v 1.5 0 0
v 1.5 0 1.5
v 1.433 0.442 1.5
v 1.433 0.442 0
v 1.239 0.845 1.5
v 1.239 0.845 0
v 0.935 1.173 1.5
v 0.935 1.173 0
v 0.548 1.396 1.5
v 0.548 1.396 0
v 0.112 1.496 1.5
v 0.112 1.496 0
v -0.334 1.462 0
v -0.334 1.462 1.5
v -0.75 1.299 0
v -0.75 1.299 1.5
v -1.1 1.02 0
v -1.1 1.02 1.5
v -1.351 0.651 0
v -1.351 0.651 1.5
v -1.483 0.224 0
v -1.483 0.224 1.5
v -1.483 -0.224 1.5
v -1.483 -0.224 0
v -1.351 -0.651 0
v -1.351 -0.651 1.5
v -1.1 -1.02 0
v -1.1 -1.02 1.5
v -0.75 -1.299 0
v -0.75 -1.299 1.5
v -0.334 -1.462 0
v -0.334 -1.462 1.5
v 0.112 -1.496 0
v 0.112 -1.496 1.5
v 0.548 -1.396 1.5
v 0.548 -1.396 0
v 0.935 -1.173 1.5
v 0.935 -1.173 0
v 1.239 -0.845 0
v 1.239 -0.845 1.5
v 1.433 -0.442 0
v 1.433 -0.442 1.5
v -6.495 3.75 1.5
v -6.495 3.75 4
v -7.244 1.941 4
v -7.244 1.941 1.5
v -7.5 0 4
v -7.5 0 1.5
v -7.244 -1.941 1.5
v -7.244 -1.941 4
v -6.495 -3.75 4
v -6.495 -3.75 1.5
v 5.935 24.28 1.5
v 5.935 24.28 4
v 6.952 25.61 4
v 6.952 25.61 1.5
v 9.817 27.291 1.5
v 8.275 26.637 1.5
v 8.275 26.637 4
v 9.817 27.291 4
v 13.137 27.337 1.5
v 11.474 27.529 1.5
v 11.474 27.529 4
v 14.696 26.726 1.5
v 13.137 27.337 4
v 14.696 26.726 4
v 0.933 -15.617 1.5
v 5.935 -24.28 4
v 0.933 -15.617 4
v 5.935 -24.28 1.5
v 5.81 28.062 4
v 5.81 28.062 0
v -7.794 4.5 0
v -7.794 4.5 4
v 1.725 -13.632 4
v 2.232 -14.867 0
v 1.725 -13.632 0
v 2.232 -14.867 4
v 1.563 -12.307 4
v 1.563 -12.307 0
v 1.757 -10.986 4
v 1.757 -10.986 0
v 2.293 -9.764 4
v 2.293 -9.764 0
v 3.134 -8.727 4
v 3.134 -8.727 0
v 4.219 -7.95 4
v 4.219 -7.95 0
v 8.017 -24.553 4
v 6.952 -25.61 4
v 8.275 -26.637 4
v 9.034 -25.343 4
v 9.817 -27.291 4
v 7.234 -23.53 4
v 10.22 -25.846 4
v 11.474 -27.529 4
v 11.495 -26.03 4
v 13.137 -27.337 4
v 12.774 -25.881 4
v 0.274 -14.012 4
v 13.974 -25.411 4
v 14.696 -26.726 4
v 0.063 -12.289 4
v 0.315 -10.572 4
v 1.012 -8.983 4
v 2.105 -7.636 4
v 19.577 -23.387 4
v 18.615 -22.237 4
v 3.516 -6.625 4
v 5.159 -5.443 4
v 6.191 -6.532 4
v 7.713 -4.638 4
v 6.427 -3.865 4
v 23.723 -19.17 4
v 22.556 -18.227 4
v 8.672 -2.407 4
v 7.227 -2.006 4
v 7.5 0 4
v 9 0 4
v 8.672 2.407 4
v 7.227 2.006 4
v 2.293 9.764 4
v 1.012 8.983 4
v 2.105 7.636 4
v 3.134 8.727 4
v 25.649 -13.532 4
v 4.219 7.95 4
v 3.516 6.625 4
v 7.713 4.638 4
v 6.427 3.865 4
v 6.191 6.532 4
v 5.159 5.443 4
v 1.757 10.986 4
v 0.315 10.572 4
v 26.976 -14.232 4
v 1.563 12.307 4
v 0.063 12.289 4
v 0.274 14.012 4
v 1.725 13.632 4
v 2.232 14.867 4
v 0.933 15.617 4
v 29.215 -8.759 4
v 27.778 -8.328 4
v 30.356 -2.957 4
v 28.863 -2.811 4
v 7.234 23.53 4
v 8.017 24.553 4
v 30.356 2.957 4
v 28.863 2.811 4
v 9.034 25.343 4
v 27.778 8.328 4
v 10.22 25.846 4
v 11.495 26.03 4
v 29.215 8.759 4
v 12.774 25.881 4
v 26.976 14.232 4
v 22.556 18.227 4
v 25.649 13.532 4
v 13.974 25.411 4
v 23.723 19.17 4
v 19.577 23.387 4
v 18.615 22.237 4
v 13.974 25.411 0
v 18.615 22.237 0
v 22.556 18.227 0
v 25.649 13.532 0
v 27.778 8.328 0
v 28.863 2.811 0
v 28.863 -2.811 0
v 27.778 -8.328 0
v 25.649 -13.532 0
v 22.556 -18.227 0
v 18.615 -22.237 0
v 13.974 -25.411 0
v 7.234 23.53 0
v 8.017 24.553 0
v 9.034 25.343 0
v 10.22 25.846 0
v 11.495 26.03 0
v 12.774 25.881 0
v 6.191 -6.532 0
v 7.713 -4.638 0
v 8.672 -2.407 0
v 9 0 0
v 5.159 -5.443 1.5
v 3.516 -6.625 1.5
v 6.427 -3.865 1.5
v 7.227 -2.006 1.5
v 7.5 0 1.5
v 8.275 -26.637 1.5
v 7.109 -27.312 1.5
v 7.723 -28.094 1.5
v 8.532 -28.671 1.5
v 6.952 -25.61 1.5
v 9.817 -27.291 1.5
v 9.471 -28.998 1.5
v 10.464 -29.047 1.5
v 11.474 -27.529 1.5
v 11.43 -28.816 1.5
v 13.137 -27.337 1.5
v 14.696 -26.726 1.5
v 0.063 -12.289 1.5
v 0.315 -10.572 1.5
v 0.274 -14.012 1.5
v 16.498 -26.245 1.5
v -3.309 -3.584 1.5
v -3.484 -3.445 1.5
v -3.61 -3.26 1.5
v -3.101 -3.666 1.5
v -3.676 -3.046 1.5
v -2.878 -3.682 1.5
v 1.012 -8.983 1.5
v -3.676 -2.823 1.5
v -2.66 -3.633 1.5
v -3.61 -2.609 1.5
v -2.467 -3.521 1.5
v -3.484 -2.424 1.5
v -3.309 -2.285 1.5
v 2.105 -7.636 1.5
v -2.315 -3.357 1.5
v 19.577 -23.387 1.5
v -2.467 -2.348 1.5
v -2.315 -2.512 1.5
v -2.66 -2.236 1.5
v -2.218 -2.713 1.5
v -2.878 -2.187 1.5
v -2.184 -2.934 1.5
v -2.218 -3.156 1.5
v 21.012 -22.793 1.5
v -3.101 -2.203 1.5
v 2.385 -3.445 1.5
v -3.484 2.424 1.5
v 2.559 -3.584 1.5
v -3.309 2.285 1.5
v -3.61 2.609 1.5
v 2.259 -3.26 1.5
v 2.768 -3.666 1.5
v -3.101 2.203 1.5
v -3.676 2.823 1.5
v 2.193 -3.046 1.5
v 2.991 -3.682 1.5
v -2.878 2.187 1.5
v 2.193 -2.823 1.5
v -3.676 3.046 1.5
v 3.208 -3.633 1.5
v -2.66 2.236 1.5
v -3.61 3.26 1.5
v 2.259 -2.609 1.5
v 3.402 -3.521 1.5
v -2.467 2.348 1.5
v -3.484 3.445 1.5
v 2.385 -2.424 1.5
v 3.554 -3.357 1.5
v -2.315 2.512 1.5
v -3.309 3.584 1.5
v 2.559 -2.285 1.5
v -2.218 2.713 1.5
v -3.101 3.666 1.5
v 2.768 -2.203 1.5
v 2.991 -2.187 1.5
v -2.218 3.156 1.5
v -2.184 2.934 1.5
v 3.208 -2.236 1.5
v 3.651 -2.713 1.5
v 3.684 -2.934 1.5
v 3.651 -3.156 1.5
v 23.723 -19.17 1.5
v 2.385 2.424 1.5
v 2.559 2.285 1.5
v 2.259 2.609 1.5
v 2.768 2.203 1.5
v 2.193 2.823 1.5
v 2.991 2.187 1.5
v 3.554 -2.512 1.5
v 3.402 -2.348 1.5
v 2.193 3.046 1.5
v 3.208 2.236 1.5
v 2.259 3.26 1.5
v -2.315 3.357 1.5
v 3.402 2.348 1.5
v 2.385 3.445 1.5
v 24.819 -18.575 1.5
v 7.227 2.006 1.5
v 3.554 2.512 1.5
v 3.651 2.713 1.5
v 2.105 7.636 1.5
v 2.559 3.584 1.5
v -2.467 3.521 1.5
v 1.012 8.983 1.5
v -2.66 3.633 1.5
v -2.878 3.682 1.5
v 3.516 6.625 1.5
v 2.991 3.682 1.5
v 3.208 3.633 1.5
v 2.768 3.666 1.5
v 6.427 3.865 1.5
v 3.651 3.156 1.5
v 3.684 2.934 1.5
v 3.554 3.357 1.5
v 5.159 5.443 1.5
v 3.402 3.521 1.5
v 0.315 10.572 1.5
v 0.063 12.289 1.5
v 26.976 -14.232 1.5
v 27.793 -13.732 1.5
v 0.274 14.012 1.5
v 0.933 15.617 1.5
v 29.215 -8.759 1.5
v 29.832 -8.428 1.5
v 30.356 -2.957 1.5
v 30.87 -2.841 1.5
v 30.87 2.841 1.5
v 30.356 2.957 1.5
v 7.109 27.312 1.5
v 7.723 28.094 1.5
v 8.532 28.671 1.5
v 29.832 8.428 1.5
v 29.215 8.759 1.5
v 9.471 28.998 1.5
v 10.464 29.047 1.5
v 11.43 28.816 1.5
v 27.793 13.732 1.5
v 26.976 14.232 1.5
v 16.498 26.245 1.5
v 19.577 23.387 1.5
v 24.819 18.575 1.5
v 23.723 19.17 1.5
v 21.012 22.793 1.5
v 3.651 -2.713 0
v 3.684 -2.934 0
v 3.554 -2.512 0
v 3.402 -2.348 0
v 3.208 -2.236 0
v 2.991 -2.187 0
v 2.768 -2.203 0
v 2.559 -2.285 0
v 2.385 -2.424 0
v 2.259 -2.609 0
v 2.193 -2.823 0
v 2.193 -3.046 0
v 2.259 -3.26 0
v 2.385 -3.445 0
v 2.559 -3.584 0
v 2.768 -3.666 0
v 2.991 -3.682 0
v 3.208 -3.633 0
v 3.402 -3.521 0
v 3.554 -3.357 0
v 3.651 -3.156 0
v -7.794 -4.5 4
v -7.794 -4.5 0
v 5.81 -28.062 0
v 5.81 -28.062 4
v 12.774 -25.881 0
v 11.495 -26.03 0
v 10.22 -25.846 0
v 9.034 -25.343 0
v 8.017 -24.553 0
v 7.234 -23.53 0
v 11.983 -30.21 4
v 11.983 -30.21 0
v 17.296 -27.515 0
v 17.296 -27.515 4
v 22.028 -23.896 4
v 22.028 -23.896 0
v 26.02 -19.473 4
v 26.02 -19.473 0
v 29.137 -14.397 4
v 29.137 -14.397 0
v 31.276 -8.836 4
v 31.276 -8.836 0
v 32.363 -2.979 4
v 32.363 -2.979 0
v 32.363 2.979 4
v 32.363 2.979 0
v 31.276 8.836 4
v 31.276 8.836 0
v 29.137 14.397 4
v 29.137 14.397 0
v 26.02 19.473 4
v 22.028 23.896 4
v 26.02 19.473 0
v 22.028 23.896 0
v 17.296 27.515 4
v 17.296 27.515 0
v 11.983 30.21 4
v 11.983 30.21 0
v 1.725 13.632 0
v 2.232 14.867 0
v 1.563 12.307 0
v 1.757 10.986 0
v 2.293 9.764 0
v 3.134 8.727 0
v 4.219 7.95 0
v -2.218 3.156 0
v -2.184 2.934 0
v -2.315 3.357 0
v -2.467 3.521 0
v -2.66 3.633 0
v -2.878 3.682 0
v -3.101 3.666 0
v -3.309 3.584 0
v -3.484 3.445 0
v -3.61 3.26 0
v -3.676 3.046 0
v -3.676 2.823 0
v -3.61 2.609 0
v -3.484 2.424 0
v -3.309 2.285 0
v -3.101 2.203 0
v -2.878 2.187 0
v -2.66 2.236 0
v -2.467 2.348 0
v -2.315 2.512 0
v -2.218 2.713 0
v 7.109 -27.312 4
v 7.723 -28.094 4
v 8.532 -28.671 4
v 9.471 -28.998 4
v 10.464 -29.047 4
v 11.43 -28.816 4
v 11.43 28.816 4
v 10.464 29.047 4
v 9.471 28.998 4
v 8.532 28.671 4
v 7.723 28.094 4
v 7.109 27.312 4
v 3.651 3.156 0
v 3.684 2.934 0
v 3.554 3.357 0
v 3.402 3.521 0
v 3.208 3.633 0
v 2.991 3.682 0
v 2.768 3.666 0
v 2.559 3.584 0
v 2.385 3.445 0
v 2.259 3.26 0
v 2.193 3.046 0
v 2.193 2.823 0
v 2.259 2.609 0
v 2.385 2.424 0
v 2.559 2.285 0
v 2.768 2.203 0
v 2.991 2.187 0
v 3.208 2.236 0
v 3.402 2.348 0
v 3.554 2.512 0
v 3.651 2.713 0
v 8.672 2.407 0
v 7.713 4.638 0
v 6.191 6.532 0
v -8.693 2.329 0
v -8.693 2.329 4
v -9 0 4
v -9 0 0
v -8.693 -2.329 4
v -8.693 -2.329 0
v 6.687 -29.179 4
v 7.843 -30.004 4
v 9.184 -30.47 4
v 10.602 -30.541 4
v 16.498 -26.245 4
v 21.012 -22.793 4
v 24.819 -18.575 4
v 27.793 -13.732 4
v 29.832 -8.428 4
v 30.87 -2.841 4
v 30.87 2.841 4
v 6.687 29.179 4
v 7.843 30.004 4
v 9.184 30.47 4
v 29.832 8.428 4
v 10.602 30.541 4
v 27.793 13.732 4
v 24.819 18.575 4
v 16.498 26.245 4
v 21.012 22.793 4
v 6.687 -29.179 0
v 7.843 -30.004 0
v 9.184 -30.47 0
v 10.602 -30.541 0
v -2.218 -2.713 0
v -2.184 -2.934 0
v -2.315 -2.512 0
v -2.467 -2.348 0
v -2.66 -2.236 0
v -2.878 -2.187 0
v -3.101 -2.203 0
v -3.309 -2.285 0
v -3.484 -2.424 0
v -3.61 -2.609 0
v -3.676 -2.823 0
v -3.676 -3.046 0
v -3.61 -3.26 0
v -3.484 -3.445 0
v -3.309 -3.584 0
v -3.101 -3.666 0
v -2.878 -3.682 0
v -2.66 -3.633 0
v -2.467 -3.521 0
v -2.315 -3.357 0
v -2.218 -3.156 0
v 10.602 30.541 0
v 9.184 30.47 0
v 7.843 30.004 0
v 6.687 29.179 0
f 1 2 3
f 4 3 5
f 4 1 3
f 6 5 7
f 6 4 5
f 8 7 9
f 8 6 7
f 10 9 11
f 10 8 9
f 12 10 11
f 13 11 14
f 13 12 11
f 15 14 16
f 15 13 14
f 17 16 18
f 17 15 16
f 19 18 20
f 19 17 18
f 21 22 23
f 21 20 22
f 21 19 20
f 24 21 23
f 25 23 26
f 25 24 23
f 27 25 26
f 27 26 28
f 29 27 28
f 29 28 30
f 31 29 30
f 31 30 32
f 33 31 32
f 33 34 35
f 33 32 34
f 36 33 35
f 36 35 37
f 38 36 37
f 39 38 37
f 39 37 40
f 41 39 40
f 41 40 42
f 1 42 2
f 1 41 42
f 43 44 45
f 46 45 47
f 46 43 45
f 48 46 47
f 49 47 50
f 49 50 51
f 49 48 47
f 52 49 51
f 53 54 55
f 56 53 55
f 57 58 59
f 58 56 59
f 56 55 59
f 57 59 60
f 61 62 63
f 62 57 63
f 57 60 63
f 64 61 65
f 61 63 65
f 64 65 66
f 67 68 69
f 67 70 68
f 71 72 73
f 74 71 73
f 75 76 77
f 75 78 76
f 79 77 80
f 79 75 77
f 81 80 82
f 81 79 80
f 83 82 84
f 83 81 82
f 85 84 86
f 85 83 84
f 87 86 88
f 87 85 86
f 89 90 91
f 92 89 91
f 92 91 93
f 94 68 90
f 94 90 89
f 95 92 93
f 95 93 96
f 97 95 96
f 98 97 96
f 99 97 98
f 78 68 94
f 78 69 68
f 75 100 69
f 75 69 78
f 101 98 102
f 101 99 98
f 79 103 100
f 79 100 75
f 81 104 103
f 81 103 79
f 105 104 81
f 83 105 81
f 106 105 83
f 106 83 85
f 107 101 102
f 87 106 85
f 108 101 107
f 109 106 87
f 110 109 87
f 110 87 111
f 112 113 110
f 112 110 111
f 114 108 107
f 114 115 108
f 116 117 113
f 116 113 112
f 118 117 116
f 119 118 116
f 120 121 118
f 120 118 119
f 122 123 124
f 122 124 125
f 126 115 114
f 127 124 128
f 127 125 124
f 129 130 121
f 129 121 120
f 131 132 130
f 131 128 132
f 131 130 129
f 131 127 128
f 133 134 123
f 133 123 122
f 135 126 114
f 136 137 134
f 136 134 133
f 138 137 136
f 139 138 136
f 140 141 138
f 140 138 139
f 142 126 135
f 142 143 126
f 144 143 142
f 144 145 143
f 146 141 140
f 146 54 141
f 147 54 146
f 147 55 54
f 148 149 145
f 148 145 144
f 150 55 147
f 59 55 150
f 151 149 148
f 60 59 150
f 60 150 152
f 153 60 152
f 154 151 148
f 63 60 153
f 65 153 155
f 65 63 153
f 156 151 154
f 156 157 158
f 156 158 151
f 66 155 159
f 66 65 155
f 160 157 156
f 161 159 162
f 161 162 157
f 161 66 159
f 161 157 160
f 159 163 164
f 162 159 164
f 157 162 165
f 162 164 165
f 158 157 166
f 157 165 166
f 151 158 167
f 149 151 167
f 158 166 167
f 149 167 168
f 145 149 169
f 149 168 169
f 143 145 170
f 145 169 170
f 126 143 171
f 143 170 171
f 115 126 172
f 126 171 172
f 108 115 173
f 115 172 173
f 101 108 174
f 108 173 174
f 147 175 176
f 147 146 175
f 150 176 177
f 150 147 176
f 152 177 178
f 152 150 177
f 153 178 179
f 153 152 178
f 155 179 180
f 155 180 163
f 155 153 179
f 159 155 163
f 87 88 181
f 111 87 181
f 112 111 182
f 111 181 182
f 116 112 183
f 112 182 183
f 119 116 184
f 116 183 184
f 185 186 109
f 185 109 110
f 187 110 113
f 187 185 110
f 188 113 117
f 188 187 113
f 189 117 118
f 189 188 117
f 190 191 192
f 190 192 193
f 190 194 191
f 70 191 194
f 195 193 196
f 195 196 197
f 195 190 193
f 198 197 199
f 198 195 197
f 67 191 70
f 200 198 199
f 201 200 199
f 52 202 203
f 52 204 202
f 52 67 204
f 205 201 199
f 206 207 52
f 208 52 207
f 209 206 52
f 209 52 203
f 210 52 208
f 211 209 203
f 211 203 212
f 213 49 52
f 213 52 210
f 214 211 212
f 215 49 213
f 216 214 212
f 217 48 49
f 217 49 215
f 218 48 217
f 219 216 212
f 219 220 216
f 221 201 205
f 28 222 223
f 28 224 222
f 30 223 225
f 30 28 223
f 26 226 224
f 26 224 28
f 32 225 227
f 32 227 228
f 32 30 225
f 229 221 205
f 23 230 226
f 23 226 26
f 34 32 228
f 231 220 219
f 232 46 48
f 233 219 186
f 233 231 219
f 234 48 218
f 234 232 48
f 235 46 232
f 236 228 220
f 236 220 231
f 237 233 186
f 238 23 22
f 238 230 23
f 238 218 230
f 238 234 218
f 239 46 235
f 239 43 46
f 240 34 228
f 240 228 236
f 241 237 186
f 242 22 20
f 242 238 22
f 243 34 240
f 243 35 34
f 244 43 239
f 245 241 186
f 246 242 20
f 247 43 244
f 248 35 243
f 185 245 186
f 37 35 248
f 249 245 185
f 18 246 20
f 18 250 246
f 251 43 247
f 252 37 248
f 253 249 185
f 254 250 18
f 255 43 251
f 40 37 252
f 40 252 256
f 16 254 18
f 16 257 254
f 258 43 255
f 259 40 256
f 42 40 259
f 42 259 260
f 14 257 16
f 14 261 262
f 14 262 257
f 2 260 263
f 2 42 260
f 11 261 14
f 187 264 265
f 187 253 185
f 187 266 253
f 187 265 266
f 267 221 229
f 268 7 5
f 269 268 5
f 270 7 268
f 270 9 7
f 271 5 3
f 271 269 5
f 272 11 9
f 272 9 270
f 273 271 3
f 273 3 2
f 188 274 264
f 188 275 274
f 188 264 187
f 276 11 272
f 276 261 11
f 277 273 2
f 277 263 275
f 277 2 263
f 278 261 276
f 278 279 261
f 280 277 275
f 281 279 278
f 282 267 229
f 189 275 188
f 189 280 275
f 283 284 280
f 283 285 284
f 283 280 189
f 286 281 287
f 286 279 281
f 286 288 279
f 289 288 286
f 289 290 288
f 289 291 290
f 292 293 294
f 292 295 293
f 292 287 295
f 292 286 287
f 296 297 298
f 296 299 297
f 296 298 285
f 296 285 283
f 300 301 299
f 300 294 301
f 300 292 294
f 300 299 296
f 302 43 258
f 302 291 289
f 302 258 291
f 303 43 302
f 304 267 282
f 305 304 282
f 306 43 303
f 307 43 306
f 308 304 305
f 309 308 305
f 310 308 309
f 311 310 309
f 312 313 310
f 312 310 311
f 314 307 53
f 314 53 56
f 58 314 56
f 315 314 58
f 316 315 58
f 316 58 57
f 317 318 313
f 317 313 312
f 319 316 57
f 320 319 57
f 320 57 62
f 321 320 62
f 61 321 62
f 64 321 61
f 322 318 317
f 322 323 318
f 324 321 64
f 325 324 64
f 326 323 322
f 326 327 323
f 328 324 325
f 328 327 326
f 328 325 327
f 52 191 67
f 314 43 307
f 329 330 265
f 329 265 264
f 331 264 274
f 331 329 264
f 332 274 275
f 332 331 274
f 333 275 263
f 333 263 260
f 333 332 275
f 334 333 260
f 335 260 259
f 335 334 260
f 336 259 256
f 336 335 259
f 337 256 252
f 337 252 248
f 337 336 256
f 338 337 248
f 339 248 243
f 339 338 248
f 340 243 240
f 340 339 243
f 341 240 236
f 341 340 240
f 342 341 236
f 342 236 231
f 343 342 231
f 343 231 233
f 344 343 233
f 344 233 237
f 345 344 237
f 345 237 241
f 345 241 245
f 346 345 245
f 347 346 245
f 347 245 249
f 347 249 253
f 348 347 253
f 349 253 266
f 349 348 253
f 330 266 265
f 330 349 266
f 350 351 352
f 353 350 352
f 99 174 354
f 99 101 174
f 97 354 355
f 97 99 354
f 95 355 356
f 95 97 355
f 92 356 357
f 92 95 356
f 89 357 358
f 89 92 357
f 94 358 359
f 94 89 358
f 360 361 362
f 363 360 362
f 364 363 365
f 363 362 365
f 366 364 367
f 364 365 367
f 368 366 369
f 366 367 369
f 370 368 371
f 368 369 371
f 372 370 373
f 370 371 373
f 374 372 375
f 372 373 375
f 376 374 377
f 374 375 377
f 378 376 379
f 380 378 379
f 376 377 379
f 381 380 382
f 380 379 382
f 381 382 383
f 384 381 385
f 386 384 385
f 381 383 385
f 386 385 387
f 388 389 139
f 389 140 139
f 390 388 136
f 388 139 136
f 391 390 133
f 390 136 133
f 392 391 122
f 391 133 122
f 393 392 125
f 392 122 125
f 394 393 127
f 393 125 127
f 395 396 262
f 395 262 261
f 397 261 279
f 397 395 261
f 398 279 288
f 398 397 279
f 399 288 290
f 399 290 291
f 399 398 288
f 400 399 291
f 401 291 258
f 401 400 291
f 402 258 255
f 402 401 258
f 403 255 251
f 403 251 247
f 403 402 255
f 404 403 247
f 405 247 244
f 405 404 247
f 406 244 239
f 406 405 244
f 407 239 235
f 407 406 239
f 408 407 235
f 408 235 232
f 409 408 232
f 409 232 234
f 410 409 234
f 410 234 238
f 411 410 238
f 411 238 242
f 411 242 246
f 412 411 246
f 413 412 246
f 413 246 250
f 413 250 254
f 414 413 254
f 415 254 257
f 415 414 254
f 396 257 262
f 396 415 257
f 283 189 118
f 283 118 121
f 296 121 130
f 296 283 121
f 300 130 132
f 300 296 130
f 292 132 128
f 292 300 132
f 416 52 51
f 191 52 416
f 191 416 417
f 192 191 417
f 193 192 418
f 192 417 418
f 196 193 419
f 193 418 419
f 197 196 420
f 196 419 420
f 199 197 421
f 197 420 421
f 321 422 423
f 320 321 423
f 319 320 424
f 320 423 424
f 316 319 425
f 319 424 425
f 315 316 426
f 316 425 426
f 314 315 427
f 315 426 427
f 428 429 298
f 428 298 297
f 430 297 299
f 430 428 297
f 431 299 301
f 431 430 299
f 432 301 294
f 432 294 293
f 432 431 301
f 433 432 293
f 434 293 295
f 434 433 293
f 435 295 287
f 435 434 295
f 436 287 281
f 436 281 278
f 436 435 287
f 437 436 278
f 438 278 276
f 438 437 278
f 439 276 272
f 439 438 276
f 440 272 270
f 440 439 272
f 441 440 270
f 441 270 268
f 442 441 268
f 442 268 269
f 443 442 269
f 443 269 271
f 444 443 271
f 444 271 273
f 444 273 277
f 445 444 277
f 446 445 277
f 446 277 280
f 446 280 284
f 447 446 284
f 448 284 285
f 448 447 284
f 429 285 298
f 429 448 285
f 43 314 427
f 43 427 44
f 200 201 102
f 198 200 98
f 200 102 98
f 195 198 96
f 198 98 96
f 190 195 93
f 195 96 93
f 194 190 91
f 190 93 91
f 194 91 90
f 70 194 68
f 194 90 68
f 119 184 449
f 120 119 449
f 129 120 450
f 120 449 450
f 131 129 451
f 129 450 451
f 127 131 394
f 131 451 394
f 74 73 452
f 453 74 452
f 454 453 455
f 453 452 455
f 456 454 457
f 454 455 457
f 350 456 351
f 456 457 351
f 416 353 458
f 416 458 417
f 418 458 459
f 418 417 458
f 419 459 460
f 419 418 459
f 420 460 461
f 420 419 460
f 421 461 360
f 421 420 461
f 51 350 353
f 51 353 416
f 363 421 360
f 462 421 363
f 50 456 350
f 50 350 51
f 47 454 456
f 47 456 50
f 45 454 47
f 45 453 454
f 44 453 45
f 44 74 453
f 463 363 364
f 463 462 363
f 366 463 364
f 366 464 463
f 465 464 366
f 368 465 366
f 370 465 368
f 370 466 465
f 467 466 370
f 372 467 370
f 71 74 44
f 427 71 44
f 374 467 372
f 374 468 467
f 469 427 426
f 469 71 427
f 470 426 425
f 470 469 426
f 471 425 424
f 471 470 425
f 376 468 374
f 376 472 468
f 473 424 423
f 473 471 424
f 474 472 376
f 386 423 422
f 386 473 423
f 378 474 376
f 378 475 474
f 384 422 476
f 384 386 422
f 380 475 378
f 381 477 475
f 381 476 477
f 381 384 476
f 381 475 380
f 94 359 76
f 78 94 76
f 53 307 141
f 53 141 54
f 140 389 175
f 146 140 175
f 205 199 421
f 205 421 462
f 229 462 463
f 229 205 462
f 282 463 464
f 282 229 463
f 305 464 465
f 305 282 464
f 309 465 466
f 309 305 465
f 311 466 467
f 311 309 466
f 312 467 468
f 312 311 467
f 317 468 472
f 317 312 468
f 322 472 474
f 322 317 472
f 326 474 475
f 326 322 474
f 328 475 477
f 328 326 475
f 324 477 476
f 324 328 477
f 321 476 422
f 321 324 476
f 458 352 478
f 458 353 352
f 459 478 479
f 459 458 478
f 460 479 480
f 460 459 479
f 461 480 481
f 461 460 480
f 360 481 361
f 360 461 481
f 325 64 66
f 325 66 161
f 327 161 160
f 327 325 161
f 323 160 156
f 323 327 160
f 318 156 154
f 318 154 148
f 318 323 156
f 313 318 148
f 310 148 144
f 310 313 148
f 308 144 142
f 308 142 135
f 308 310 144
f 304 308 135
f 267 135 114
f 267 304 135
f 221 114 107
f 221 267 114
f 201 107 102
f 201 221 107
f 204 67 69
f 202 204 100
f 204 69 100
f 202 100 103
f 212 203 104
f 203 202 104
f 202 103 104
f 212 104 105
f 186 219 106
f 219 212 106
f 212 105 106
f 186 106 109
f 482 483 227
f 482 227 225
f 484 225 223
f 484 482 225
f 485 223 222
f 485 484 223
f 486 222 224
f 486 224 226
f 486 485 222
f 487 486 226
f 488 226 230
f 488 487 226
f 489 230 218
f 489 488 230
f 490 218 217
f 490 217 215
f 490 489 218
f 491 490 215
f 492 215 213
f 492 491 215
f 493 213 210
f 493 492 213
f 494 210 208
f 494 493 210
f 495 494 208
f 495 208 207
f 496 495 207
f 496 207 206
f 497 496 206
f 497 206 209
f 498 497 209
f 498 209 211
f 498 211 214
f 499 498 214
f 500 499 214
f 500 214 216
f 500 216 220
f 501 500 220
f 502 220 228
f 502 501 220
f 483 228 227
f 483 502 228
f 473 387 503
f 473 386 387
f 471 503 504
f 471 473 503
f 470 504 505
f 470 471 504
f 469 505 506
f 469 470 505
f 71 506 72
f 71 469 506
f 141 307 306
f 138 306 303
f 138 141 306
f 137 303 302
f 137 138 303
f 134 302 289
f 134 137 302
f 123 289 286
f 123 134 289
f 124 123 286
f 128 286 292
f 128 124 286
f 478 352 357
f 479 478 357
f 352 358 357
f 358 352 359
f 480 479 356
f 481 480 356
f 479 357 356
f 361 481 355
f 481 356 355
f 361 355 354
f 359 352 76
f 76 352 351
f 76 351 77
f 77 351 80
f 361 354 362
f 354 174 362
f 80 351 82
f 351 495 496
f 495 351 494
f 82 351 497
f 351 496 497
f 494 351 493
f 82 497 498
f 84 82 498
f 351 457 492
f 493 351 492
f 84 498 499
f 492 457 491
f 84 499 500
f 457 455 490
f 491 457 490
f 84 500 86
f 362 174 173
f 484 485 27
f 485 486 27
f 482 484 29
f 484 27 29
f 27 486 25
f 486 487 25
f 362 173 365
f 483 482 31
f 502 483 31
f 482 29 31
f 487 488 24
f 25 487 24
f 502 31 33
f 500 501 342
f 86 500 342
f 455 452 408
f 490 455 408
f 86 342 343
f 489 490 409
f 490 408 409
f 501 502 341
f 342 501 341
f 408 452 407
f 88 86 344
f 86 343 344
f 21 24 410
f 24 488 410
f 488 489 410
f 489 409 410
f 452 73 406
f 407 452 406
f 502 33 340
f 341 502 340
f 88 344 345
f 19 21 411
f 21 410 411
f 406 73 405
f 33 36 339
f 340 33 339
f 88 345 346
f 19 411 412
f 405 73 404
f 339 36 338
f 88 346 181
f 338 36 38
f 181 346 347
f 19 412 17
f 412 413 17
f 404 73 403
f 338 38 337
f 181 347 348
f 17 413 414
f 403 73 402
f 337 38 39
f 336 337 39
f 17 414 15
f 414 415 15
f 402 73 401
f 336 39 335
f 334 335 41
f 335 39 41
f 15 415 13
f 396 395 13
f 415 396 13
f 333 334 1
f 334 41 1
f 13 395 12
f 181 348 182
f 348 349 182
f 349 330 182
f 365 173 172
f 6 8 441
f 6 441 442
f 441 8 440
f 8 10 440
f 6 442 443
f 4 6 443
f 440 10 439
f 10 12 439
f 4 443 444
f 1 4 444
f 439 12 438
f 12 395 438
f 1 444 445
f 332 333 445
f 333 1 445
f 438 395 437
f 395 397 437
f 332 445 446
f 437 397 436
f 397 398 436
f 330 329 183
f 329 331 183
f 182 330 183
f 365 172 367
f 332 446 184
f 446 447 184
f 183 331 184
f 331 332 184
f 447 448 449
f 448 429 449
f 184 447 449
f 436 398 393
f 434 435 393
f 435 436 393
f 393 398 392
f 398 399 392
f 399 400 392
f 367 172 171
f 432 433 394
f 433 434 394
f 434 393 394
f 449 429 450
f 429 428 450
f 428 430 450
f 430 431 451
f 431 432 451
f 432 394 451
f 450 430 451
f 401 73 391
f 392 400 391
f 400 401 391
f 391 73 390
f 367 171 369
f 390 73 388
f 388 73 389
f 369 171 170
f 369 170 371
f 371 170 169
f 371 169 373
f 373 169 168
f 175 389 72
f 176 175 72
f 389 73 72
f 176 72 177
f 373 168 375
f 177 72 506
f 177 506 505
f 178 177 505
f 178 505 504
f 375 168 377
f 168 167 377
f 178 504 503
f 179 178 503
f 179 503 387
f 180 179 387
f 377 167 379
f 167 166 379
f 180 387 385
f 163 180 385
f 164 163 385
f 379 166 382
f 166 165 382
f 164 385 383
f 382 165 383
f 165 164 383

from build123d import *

# Parameters (mm, degrees)
F1_DEPTH = 4
F2_R     = 5
F3_T     = -1.5
F4_R     = 1.5
F5_DEPTH = 3
F6_R     = 0.75
F7_DEPTH = 1.5


with BuildPart() as f1:
    # F0 (on Top) → F1 (new body)
    with BuildSketch(Plane.XY):
        with BuildLine():
            ThreePointArc((-7.794229, 4.5), (-5.011221, 7.475805), (-1.201188, 8.919481))
            Line((-1.201188, 8.919481), (9.473696, 27.408923))
            ThreePointArc((9.473696, 27.408923), (29, 0), (9.473696, -27.408923))
            Line((9.473696, -27.408923), (-1.201188, -8.919481))
            ThreePointArc((-1.201188, -8.919481), (-5.011221, -7.475805), (-7.794229, -4.5))
            Line((-7.794229, -4.5), (7.820268, -31.545101))
            ThreePointArc((7.820268, -31.545101), (32.5, 0), (7.820268, 31.545101))
            Line((7.820268, 31.545101), (-7.794229, 4.5))
        make_face()
        with BuildLine():
            ThreePointArc((-1.201188, -8.919481), (5.924074, -6.775348), (9, 0))
            ThreePointArc((9, 0), (5.924074, 6.775348), (-1.201188, 8.919481))
            ThreePointArc((-1.201188, 8.919481), (-5.011221, 7.475805), (-7.794229, 4.5))
            ThreePointArc((-7.794229, 4.5), (-9, 0), (-7.794229, -4.5))
            ThreePointArc((-7.794229, -4.5), (-5.011221, -7.475805), (-1.201188, -8.919481))
        make_face()
    extrude(amount=F1_DEPTH)

    # F2
    f2_edges = [f1.edges().sort_by_distance(p)[0] for p in [
        (9.473696, 27.408923, 2),
        (9.473696, -27.408923, 2),
        (7.820268, 31.545101, 2),
        (-1.201188, -8.919481, 2),
        (-1.201188, 8.919481, 2),
        (7.820268, -31.545101, 2),
    ]]
    fillet(f2_edges, radius=F2_R)

    # F3
    f3_openings = [f1.faces().sort_by_distance(p)[0] for p in [
        (7.079481, -4.25771, 4),
    ]]
    offset(amount=F3_T, openings=f3_openings)

    # F4 (on Top) → F5 (cut)
    with BuildSketch(Plane.XY):
        Circle(F4_R)
    extrude(amount=F5_DEPTH, mode=Mode.SUBTRACT)

    # F6 (on Top) → F7 (cut, through all)
    with BuildSketch(Plane.XY):
        with Locations((2.934493, 2.934493)):
            Circle(F6_R)
        with Locations((-2.934493, 2.934493)):
            Circle(F6_R)
        with Locations((-2.934493, -2.934493)):
            Circle(F6_R)
        with Locations((2.934493, -2.934493)):
            Circle(F6_R)
    extrude(amount=F7_DEPTH, mode=Mode.SUBTRACT)


solid = f1.part
